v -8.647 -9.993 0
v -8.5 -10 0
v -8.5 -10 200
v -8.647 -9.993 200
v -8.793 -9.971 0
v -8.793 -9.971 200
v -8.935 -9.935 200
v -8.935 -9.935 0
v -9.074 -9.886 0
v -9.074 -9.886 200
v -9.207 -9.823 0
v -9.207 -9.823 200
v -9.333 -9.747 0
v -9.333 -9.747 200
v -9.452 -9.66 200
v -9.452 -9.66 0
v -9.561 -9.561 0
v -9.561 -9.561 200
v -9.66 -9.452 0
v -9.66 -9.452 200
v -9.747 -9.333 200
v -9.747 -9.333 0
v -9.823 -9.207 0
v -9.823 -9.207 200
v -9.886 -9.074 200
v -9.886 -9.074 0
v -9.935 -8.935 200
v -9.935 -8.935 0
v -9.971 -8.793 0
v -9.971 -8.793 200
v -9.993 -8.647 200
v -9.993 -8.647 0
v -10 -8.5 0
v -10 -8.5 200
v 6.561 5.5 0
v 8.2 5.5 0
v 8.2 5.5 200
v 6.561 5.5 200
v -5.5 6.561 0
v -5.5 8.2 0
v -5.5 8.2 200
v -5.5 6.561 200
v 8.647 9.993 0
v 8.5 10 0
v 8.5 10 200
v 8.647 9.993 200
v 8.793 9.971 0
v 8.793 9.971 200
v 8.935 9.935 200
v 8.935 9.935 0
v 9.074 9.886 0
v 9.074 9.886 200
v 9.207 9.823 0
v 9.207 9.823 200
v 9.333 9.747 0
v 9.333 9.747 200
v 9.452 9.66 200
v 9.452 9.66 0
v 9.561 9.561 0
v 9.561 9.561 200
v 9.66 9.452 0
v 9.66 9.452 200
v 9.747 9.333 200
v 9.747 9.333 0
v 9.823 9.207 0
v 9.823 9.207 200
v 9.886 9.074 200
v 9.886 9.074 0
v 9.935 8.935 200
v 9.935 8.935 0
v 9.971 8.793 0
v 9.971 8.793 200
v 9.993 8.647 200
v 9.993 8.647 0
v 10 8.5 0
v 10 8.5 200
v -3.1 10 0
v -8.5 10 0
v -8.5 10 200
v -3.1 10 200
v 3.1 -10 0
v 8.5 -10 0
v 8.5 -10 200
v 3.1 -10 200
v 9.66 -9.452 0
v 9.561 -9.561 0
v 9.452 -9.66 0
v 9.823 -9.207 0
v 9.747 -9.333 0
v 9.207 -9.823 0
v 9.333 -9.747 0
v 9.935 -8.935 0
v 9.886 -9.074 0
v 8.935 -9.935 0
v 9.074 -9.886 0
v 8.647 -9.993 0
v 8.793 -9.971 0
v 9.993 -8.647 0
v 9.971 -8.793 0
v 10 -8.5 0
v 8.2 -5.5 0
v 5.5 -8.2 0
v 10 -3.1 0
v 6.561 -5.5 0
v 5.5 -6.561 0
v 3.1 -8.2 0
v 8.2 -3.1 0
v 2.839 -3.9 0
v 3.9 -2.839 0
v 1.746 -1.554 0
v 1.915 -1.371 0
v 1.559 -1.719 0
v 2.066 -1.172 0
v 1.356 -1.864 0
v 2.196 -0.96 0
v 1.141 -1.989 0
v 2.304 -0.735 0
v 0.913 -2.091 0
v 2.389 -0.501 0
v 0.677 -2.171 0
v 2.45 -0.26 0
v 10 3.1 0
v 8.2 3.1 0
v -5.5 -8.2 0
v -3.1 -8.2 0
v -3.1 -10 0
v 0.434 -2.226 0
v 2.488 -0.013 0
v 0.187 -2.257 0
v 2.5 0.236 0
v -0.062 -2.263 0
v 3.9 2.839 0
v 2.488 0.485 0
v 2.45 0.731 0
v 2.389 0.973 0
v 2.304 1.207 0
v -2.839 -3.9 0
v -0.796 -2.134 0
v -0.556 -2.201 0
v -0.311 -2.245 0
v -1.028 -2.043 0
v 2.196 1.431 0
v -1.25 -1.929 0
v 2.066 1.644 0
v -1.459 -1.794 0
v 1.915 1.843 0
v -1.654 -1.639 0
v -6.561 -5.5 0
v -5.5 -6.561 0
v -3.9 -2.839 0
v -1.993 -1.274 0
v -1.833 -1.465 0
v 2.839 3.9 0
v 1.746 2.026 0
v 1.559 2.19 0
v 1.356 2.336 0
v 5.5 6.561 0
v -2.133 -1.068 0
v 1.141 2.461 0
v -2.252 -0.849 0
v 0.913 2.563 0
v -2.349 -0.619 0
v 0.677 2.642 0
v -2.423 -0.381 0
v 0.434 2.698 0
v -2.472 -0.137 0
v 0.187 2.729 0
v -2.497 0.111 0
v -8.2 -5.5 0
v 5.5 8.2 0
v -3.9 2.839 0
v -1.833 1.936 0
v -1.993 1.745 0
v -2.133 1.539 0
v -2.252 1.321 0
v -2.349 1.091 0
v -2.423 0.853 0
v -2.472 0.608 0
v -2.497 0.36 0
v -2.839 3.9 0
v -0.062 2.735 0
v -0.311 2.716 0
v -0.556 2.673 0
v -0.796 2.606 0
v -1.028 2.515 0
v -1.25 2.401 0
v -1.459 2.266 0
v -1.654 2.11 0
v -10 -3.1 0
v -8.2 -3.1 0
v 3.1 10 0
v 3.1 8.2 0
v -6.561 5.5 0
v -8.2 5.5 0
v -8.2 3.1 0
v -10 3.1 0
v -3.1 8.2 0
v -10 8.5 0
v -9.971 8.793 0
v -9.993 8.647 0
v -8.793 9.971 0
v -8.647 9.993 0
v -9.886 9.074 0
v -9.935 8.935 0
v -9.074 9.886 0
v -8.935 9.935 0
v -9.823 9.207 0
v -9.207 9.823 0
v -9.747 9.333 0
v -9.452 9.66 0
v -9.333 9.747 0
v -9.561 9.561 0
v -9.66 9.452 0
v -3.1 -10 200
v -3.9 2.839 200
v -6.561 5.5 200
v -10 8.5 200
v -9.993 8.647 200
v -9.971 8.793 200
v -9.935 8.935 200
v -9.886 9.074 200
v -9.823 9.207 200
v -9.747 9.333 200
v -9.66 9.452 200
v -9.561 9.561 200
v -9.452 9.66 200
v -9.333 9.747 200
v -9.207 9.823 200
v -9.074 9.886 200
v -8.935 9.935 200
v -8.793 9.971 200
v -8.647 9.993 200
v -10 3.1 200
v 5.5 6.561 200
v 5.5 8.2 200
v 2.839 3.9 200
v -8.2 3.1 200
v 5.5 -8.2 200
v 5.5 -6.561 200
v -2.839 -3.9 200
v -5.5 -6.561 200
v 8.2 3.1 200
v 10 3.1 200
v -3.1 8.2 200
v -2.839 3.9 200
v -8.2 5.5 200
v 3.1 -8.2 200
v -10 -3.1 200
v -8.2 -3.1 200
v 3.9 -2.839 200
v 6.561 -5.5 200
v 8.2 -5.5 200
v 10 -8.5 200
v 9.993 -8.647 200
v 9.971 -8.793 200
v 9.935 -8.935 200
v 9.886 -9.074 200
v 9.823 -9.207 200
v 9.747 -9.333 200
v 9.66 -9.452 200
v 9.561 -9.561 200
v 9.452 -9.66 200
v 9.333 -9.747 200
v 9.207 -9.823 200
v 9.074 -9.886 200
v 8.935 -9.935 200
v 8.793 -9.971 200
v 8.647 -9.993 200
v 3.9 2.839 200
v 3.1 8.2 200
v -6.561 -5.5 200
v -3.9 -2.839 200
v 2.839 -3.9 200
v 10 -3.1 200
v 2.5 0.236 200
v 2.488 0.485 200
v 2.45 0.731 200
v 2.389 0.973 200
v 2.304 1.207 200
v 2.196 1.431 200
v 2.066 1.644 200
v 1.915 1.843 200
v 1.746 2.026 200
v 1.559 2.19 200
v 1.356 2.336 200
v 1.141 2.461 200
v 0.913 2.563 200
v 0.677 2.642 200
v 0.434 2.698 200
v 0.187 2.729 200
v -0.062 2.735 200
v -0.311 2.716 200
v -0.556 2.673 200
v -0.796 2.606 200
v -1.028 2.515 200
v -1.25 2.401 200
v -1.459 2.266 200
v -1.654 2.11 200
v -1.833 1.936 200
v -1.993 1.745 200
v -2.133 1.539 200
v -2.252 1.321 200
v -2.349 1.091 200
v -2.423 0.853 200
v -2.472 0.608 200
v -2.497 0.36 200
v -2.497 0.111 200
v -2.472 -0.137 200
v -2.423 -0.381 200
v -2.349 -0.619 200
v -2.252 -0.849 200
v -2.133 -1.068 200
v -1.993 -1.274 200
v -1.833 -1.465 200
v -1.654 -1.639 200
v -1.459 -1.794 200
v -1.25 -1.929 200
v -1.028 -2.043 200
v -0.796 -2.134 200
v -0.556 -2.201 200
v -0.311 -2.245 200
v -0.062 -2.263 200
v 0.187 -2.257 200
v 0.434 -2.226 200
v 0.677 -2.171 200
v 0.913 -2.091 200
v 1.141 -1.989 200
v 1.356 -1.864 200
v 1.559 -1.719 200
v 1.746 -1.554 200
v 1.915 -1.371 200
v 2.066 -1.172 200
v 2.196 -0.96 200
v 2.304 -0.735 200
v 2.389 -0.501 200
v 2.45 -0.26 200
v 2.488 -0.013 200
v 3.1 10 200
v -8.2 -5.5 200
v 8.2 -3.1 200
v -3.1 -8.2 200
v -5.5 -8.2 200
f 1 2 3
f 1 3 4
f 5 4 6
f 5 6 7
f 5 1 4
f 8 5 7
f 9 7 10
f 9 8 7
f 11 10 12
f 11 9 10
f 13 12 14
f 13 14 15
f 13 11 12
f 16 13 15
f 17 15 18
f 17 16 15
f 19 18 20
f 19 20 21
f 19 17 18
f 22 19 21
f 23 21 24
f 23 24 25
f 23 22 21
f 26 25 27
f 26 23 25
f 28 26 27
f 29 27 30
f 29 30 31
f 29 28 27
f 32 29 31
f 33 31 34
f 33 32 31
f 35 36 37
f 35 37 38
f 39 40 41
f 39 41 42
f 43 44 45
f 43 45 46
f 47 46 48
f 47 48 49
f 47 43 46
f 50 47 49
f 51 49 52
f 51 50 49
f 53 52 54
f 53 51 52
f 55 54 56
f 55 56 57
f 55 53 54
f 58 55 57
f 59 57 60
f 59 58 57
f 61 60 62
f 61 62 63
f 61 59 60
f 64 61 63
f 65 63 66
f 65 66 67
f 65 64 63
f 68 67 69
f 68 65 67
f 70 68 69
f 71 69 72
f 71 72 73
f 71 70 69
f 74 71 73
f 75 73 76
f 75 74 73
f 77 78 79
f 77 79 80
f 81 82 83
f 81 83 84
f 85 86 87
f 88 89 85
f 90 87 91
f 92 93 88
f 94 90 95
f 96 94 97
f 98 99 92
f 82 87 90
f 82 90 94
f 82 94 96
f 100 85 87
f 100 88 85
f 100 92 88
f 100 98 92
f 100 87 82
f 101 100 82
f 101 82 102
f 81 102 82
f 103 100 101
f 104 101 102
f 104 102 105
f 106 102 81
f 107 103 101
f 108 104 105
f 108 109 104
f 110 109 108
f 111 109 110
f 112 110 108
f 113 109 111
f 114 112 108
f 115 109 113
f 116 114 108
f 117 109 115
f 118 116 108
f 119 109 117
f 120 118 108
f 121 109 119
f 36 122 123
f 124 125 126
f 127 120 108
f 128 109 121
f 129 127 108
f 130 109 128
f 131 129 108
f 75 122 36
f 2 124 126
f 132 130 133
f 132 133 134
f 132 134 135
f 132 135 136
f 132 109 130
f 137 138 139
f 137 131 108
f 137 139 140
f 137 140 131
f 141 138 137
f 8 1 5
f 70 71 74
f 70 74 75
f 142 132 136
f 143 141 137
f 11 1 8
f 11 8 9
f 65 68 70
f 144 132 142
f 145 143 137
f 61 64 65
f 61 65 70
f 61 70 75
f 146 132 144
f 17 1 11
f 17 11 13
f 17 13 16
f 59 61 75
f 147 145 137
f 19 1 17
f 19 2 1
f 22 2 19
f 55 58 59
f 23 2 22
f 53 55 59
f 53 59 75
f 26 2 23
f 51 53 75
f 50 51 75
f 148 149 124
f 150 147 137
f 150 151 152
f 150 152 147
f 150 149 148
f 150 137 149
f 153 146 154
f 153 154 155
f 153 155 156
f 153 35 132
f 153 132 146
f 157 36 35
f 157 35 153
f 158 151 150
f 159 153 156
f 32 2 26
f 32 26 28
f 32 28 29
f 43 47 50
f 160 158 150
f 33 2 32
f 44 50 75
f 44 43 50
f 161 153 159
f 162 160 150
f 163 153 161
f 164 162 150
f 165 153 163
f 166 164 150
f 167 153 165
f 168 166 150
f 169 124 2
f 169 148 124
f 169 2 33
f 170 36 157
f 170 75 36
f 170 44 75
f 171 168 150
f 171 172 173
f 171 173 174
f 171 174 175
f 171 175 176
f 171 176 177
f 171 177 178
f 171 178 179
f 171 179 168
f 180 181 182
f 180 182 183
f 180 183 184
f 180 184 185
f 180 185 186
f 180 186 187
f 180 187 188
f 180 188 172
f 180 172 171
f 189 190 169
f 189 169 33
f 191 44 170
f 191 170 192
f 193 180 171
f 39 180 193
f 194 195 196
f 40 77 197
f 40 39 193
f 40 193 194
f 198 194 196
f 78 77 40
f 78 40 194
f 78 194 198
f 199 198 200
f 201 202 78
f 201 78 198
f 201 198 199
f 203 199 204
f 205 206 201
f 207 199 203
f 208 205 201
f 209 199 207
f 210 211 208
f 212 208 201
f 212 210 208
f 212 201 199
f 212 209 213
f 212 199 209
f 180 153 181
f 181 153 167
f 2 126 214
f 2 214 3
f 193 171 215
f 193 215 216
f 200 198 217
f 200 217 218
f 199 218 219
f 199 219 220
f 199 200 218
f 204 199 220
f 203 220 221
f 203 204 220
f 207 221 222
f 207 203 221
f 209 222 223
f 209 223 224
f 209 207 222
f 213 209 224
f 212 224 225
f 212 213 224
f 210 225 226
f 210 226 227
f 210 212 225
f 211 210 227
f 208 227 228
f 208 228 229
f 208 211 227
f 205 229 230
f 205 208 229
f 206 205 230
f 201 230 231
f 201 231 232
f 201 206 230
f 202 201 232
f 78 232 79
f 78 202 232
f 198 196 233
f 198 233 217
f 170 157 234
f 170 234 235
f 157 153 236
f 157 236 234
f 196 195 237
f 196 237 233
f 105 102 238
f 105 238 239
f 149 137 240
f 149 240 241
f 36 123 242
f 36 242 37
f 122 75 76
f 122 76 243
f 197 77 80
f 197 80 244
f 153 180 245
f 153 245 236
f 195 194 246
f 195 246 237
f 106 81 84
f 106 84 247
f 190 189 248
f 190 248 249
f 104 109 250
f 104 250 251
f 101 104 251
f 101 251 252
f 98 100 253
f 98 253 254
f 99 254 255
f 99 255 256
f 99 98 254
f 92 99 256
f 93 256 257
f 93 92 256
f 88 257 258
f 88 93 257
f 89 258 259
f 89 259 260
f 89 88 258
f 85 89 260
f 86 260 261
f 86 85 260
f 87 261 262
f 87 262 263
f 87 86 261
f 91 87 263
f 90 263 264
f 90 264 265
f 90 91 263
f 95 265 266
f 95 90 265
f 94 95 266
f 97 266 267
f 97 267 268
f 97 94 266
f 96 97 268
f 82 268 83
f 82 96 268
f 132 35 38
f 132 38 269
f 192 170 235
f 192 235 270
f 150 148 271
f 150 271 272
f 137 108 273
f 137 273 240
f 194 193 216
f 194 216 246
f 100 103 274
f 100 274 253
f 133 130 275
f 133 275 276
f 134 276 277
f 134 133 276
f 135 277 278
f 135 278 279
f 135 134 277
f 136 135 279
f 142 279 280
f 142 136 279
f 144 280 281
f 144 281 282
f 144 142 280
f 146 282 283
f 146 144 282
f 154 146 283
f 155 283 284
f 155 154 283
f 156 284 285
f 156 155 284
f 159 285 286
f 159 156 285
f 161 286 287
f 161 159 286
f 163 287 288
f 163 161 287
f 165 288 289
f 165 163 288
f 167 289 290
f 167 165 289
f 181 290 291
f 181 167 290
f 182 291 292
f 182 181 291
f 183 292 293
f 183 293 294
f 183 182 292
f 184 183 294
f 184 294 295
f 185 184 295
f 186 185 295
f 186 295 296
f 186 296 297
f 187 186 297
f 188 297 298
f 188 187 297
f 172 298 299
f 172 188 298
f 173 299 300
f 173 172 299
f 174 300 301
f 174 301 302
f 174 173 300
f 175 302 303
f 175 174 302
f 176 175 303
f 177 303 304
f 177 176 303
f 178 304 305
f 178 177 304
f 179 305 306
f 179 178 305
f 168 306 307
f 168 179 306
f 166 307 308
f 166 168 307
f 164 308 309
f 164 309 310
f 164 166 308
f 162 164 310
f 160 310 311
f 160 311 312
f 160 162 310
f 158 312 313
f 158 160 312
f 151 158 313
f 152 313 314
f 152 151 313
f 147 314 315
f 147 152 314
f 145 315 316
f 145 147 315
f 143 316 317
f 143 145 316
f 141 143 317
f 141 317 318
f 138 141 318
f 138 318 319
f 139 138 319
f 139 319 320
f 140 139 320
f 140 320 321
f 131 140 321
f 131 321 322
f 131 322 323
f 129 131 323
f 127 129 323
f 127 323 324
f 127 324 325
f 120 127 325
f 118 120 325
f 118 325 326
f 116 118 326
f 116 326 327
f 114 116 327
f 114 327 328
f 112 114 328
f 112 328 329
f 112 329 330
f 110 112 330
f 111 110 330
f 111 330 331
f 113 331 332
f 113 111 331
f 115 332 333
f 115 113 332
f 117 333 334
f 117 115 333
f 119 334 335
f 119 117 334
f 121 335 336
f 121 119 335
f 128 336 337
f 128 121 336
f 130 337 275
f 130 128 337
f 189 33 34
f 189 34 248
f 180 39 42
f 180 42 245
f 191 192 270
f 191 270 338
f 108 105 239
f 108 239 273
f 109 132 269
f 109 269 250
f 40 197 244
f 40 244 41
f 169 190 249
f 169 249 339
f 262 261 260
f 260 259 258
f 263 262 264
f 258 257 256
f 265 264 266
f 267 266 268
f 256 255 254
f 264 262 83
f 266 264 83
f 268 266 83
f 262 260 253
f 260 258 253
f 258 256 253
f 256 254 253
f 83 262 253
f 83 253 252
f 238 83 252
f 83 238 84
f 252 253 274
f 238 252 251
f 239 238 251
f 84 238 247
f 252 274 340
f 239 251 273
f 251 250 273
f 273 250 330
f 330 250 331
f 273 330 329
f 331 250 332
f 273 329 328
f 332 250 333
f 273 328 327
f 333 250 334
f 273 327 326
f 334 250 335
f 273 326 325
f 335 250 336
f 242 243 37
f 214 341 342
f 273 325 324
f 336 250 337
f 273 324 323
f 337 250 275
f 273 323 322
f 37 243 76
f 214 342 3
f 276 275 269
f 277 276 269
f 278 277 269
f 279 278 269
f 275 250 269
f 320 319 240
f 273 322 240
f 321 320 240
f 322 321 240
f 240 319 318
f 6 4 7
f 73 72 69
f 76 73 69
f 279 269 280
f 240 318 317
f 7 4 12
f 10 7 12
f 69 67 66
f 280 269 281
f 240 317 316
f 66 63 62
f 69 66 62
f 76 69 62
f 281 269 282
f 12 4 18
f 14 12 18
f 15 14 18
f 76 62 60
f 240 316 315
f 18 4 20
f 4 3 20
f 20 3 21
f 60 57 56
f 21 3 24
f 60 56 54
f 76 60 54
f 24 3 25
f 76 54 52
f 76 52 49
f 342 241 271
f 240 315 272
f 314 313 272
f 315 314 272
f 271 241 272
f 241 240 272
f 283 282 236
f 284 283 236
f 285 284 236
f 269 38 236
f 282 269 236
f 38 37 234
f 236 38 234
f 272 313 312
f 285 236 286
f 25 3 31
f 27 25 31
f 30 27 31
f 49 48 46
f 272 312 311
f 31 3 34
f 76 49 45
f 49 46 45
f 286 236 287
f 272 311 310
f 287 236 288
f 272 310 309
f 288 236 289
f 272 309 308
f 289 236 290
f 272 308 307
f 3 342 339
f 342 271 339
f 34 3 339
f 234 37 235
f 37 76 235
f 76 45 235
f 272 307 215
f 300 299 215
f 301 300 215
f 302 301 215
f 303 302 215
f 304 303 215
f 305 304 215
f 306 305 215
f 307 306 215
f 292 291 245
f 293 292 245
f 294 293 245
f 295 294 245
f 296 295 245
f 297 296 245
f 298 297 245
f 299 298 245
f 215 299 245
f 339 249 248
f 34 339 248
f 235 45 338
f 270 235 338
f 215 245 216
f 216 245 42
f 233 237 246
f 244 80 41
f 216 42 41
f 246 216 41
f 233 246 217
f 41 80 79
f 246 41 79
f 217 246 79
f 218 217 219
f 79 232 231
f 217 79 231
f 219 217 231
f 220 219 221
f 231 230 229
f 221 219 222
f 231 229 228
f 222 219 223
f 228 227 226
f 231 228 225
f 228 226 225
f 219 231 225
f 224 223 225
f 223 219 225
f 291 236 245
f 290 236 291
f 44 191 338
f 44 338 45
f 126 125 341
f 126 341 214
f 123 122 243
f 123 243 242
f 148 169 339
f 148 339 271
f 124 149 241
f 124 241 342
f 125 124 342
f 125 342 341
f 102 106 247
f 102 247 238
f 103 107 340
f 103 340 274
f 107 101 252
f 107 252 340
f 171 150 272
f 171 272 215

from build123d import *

# Parameters (mm, degrees)
SKETCH1_R           = 2.5
BOSS_EXTRUDE1_DEPTH = 200


with BuildPart() as part:
    # Sketch1 → Boss-Extrude1 (new body)
    with BuildSketch(Plane.XY):
        with BuildLine():
            Line((2.839339828, 3.9), (5.5, 6.560660172))
            Line((5.5, 6.560660172), (5.5, 8.2))
            Line((5.5, 8.2), (3.1, 8.2))
            Line((3.1, 8.2), (3.1, 10))
            Line((3.1, 10), (8.5, 10))
            ThreePointArc((8.5, 10), (9.560660172, 9.560660172), (10, 8.5))
            Line((10, 8.5), (10, 3.1))
            Line((10, 3.1), (8.2, 3.1))
            Line((8.2, 3.1), (8.2, 5.5))
            Line((8.2, 5.5), (6.560660172, 5.5))
            Line((6.560660172, 5.5), (3.9, 2.839339828))
            Line((3.9, 2.839339828), (3.9, -2.839339828))
            Line((3.9, -2.839339828), (6.560660172, -5.5))
            Line((6.560660172, -5.5), (8.2, -5.5))
            Line((8.2, -5.5), (8.2, -3.1))
            Line((8.2, -3.1), (10, -3.1))
            Line((10, -3.1), (10, -8.5))
            ThreePointArc((10, -8.5), (9.560660172, -9.560660172), (8.5, -10))
            Line((8.5, -10), (3.1, -10))
            Line((3.1, -10), (3.1, -8.2))
            Line((3.1, -8.2), (5.5, -8.2))
            Line((5.5, -8.2), (5.5, -6.560660172))
            Line((5.5, -6.560660172), (2.839339828, -3.9))
            Line((2.839339828, -3.9), (-2.839339828, -3.9))
            Line((-2.839339828, -3.9), (-5.5, -6.560660172))
            Line((-5.5, -6.560660172), (-5.5, -8.2))
            Line((-5.5, -8.2), (-3.1, -8.2))
            Line((-3.1, -8.2), (-3.1, -10))
            Line((-3.1, -10), (-8.5, -10))
            ThreePointArc((-8.5, -10), (-9.560660172, -9.560660172), (-10, -8.5))
            Line((-10, -8.5), (-10, -3.1))
            Line((-10, -3.1), (-8.2, -3.1))
            Line((-8.2, -3.1), (-8.2, -5.5))
            Line((-8.2, -5.5), (-6.560660172, -5.5))
            Line((-6.560660172, -5.5), (-3.9, -2.839339828))
            Line((-3.9, -2.839339828), (-3.9, 2.839339828))
            Line((-3.9, 2.839339828), (-6.560660172, 5.5))
            Line((-6.560660172, 5.5), (-8.2, 5.5))
            Line((-8.2, 5.5), (-8.2, 3.1))
            Line((-8.2, 3.1), (-10, 3.1))
            Line((-10, 3.1), (-10, 8.5))
            ThreePointArc((-10, 8.5), (-9.560660172, 9.560660172), (-8.5, 10))
            Line((-8.5, 10), (-3.1, 10))
            Line((-3.1, 10), (-3.1, 8.2))
            Line((-3.1, 8.2), (-5.5, 8.2))
            Line((-5.5, 8.2), (-5.5, 6.560660172))
            Line((-5.5, 6.560660172), (-2.839339828, 3.9))
            Line((-2.839339828, 3.9), (2.839339828, 3.9))
        make_face()
        with Locations((0, 0.235847297)):
            Circle(SKETCH1_R, mode=Mode.SUBTRACT)
    extrude(amount=BOSS_EXTRUDE1_DEPTH)


solid = part.part
